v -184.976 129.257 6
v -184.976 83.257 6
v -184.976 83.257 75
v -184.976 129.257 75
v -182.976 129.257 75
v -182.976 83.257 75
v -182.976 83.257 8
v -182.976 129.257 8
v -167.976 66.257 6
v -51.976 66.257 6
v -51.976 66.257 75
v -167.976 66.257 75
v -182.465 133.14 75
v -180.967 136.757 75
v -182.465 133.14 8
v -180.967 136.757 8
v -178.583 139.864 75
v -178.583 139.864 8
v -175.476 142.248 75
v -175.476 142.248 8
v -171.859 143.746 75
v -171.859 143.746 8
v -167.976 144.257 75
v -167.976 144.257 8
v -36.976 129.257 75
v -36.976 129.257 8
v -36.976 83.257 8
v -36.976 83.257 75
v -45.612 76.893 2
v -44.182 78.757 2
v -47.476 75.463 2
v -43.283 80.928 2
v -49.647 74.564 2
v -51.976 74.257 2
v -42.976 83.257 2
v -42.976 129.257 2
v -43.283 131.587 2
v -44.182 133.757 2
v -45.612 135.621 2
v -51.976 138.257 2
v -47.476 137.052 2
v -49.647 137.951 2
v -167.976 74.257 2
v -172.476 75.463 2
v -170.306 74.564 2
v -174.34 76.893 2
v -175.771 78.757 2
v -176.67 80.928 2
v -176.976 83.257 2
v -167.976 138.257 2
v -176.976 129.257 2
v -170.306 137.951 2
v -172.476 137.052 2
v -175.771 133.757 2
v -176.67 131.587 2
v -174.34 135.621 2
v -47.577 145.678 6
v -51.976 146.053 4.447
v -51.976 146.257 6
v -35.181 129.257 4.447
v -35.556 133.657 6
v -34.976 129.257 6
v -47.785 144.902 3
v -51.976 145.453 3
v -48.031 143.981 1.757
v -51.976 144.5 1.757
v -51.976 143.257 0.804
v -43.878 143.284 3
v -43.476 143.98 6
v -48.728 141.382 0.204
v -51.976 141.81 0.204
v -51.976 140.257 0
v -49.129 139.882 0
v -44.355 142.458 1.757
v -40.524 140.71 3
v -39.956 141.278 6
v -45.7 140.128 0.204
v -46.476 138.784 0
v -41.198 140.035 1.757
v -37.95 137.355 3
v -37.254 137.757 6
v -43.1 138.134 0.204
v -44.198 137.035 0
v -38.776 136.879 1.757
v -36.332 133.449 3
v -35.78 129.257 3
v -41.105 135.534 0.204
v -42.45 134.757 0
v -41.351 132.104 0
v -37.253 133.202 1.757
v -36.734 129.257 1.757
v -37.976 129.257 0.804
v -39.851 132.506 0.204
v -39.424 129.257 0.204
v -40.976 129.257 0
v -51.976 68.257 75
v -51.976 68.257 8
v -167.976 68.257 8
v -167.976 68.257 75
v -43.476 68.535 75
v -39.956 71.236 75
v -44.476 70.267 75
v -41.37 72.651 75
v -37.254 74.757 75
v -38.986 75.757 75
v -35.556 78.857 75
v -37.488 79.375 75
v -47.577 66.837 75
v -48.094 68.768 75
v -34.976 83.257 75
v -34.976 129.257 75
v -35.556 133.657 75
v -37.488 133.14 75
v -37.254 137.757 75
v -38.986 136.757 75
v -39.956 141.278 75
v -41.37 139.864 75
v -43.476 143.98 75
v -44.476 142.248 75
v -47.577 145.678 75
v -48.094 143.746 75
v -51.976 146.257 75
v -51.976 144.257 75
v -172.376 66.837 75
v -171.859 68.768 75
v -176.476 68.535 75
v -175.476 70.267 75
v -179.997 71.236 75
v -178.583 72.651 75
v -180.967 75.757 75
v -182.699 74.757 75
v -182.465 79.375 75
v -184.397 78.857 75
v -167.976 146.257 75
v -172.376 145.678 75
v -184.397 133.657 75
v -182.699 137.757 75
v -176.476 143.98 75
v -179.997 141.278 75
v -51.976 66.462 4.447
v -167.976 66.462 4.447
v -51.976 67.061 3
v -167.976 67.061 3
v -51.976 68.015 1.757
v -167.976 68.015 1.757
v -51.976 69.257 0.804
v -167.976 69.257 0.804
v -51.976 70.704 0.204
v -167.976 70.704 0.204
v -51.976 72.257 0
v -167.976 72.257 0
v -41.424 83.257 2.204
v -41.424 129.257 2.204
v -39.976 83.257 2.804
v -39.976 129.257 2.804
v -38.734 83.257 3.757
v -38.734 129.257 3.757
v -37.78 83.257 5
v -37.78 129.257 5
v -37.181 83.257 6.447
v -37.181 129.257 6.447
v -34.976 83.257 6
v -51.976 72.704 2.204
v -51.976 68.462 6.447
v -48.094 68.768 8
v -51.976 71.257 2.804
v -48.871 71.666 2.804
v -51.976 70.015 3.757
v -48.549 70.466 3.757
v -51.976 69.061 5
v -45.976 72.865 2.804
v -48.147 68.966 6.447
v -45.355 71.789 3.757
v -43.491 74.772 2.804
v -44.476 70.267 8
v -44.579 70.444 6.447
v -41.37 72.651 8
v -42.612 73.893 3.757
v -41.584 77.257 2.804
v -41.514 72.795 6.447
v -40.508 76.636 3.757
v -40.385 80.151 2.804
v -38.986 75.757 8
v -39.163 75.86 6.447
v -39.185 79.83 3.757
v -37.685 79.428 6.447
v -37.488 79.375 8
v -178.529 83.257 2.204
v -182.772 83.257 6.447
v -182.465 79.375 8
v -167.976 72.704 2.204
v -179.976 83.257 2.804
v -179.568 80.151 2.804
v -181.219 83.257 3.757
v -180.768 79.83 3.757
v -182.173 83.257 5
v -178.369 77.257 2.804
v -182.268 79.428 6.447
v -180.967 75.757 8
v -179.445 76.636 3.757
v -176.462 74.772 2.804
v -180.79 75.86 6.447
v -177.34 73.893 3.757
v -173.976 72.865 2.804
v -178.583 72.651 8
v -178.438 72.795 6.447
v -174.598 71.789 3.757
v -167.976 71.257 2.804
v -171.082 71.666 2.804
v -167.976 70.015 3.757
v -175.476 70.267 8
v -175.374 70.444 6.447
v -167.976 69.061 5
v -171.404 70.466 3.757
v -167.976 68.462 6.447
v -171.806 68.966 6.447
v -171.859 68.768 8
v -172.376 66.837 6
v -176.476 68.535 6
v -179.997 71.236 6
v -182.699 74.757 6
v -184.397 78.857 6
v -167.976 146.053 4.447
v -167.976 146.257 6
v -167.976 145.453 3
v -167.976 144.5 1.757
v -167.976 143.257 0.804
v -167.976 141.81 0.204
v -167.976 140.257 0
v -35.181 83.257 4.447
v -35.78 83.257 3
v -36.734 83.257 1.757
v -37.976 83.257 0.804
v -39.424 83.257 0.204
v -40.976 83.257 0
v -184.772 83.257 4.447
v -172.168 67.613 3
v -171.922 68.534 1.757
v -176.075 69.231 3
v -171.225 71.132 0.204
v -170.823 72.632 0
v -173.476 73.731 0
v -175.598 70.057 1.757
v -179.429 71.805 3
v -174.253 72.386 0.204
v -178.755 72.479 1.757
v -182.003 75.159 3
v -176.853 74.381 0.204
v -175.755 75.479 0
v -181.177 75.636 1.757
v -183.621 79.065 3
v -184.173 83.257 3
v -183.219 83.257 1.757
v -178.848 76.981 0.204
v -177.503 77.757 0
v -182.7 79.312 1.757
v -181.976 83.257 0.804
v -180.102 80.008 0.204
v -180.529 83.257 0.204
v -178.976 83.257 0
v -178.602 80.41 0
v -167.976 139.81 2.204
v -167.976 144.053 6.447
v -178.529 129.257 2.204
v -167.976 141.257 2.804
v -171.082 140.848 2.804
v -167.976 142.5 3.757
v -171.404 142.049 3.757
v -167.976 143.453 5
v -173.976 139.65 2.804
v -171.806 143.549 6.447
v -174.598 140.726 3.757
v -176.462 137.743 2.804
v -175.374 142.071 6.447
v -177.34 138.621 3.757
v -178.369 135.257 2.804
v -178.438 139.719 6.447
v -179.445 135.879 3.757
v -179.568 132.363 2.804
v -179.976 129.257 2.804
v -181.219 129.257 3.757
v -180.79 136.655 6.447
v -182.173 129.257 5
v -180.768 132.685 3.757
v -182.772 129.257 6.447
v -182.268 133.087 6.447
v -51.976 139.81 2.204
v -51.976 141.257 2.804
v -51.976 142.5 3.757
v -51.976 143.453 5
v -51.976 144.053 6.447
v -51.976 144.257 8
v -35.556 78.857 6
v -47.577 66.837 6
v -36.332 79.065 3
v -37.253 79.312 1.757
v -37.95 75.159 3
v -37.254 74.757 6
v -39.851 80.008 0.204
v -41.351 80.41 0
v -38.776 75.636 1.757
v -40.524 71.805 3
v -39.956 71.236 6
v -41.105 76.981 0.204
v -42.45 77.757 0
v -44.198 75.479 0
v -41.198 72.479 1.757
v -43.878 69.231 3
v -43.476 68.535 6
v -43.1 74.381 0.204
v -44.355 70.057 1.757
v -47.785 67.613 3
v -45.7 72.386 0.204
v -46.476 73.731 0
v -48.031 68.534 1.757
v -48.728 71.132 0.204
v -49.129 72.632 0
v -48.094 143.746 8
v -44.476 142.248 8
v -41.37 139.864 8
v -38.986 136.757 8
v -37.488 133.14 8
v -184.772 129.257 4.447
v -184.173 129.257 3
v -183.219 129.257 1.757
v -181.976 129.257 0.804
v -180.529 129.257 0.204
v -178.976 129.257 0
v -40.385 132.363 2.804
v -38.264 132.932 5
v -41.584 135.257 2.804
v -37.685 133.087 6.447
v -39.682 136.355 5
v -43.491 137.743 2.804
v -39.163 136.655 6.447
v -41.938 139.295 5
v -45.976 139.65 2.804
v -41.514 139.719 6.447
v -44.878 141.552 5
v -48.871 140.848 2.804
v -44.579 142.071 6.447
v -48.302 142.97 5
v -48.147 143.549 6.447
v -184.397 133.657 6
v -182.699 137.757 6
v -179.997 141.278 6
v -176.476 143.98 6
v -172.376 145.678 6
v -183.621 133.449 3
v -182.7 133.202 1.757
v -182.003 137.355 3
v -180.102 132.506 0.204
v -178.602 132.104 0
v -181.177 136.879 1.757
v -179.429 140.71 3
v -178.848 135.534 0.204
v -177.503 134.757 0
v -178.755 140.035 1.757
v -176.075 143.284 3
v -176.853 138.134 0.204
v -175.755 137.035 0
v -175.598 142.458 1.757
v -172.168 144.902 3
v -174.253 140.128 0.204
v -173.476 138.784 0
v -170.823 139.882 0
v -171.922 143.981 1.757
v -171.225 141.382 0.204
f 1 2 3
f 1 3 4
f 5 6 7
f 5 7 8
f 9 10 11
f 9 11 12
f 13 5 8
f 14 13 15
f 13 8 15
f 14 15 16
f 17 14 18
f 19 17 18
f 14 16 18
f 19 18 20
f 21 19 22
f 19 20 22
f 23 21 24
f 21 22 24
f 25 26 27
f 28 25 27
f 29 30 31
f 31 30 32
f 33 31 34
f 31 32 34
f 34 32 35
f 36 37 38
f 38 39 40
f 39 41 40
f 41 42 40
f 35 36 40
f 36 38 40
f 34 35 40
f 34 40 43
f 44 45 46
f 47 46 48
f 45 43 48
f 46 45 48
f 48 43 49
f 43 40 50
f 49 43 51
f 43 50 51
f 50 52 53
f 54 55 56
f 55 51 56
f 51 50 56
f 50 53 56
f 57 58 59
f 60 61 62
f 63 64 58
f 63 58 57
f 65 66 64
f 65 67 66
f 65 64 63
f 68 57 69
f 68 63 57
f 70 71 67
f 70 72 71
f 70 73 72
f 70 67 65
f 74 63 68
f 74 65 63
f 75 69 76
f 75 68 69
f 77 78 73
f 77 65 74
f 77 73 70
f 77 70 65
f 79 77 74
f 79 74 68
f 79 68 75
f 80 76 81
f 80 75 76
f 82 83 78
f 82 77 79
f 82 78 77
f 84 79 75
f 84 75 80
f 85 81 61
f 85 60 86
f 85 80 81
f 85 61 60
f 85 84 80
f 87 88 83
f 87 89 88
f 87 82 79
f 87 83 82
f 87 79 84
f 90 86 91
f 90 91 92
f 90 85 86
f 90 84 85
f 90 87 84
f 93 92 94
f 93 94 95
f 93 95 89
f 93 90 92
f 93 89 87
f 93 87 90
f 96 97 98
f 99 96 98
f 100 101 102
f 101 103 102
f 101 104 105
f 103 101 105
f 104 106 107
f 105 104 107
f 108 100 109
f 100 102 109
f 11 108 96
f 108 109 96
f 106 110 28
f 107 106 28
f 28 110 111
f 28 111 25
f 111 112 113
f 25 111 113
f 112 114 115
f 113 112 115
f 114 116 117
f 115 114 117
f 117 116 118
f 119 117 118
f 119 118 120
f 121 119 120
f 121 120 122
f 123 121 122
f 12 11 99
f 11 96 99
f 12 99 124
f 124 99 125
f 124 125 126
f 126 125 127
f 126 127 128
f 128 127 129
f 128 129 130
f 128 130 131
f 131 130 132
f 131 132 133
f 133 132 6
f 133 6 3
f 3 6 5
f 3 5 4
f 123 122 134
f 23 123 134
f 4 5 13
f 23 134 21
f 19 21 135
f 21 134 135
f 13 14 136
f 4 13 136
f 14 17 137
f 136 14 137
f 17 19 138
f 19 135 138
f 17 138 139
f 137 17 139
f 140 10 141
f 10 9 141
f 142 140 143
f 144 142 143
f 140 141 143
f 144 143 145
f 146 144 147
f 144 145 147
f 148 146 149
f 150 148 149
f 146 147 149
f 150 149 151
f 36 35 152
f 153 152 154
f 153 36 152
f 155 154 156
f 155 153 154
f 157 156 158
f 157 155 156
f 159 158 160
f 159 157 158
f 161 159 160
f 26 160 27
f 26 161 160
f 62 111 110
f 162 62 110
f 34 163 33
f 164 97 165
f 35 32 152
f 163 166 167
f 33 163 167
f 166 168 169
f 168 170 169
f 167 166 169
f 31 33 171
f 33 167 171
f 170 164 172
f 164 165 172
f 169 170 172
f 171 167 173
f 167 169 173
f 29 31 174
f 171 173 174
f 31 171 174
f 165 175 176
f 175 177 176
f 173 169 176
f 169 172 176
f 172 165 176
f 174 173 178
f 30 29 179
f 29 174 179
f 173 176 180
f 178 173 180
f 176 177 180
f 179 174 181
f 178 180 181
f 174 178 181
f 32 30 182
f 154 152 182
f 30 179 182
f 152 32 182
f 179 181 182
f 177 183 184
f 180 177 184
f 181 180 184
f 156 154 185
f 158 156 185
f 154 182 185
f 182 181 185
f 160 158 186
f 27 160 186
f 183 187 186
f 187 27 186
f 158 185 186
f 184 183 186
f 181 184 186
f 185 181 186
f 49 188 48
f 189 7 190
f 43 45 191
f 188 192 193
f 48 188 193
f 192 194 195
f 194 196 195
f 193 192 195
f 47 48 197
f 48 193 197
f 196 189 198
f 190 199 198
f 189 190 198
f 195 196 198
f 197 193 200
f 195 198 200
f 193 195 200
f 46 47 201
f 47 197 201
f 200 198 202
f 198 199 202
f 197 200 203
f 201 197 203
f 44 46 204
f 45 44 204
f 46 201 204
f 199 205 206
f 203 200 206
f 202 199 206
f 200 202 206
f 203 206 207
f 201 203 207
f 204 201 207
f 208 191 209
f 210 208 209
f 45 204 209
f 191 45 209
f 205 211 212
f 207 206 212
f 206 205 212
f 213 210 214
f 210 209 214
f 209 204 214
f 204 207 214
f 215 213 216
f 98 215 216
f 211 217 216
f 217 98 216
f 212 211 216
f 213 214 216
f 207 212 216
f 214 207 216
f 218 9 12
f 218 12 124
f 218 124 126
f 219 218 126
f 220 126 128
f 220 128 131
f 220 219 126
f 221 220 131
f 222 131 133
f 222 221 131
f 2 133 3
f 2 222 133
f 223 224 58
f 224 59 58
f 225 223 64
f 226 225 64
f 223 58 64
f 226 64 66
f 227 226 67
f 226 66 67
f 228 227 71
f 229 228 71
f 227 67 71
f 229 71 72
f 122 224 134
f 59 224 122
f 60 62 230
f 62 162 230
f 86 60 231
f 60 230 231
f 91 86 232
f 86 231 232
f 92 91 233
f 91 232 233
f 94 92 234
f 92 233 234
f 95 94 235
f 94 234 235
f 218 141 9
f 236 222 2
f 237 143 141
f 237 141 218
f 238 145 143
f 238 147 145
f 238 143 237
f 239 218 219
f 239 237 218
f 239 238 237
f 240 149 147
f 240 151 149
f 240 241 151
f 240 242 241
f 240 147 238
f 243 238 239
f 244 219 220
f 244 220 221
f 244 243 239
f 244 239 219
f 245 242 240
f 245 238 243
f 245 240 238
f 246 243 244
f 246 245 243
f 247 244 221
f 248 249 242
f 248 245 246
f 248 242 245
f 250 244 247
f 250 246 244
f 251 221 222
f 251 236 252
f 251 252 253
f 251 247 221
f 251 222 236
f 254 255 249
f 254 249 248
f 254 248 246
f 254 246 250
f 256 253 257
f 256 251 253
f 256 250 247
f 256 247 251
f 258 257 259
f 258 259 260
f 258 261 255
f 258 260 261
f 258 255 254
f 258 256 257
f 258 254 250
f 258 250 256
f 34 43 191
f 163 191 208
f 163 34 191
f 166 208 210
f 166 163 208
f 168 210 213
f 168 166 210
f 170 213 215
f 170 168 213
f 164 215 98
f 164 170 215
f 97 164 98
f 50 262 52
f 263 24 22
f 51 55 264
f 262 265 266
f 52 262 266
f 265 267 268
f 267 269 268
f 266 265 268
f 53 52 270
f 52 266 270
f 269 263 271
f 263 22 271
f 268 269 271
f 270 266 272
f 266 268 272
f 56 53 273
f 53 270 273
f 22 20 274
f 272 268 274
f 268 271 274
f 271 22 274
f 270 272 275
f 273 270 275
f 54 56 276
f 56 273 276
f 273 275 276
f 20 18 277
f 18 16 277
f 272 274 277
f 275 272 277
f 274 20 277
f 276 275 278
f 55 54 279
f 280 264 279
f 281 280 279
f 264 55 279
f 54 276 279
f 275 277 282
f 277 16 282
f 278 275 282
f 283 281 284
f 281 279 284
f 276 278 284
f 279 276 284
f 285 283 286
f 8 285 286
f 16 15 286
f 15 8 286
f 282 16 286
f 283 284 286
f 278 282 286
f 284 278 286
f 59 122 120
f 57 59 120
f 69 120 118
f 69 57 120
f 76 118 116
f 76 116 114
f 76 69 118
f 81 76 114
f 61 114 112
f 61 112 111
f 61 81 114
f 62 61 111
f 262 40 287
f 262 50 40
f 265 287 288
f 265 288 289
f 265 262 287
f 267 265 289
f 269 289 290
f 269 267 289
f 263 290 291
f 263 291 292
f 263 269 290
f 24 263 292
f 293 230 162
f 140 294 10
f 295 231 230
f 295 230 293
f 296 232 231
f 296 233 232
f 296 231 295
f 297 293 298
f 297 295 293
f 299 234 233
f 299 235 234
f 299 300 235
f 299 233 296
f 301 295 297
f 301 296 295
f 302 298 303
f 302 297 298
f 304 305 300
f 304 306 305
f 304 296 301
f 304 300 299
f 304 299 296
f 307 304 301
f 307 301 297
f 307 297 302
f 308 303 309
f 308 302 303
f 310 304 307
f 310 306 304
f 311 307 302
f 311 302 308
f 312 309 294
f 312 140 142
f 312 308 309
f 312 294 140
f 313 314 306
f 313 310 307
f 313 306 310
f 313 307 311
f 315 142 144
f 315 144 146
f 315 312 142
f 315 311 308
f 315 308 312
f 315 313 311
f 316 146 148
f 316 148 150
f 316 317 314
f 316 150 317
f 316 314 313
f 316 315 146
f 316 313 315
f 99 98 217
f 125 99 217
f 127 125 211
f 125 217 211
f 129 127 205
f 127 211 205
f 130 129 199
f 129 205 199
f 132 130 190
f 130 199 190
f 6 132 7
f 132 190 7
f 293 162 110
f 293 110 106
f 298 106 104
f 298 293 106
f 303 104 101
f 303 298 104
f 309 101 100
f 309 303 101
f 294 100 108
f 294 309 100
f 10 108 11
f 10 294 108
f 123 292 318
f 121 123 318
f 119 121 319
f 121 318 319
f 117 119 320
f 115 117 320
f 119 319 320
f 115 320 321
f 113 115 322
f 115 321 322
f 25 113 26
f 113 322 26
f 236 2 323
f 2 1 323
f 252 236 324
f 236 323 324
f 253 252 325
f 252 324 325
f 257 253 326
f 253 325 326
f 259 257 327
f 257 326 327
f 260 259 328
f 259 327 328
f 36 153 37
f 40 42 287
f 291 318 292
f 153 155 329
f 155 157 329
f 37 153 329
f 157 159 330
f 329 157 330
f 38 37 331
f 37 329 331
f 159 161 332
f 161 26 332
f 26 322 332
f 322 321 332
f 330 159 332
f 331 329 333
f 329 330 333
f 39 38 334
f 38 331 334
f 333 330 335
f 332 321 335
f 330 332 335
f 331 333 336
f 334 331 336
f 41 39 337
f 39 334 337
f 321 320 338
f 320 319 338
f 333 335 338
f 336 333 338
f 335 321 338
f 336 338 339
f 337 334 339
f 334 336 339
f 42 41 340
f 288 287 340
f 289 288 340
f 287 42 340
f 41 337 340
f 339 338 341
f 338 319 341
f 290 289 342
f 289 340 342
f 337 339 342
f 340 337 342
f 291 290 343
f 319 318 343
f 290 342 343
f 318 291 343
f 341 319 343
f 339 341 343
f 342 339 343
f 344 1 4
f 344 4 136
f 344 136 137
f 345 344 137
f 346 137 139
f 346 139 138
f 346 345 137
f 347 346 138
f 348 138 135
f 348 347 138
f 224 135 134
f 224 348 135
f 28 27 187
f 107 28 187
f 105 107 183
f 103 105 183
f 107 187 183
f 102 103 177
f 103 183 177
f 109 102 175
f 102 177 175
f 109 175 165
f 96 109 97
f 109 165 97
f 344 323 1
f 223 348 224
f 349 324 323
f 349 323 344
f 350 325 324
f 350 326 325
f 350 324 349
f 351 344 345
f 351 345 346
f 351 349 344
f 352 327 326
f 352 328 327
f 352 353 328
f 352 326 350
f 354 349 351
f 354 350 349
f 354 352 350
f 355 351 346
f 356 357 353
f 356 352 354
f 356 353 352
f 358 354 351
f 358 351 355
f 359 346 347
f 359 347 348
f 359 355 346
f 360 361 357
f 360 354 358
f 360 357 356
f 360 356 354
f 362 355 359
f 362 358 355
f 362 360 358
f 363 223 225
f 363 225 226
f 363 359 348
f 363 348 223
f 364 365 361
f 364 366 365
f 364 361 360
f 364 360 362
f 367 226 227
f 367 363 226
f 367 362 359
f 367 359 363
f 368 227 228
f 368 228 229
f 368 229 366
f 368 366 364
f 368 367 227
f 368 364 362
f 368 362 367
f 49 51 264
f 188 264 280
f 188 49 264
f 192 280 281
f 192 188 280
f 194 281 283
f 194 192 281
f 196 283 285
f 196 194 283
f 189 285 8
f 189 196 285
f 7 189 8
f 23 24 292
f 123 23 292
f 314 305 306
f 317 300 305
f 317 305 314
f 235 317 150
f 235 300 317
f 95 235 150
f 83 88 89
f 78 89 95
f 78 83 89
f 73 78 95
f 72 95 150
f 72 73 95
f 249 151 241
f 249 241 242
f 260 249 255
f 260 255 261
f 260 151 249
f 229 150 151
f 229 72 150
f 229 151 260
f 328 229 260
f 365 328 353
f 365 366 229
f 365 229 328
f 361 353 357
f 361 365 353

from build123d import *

# Parameters (mm, degrees)
BOSS_EXTRUDE1_DEPTH = 75
BOSS_EXTRUDE2_DEPTH = 2
FILLET1_R           = 6


with BuildPart() as part:
    # Sketch2 → Boss-Extrude1 (new body)
    with BuildSketch(Plane.XY):
        with BuildLine():
            Line((-167.97646099, 146.257283518), (-51.97646099, 146.257283518))
            ThreePointArc((-51.97646099, 146.257283518), (-39.95564571, 141.278098799), (-34.97646099, 129.257283518))
            Line((-34.97646099, 129.257283518), (-34.97646099, 83.257283518))
            ThreePointArc((-34.97646099, 83.257283518), (-39.95564571, 71.236468238), (-51.97646099, 66.257283518))
            Line((-51.97646099, 66.257283518), (-167.97646099, 66.257283518))
            ThreePointArc((-167.97646099, 66.257283518), (-179.99727627, 71.236468238), (-184.97646099, 83.257283518))
            Line((-184.97646099, 83.257283518), (-184.97646099, 129.257283518))
            ThreePointArc((-184.97646099, 129.257283518), (-179.99727627, 141.278098799), (-167.97646099, 146.257283518))
        make_face()
        with BuildLine():
            Line((-167.97646099, 144.257283518), (-51.97646099, 144.257283518))
            ThreePointArc((-51.97646099, 144.257283518), (-41.369859272, 139.863885236), (-36.97646099, 129.257283518))
            Line((-36.97646099, 129.257283518), (-36.97646099, 83.257283518))
            ThreePointArc((-36.97646099, 83.257283518), (-41.369859272, 72.650681801), (-51.97646099, 68.257283518))
            Line((-51.97646099, 68.257283518), (-167.97646099, 68.257283518))
            ThreePointArc((-167.97646099, 68.257283518), (-178.583062708, 72.650681801), (-182.97646099, 83.257283518))
            Line((-182.97646099, 83.257283518), (-182.97646099, 129.257283518))
            ThreePointArc((-182.97646099, 129.257283518), (-178.583062708, 139.863885236), (-167.97646099, 144.257283518))
        make_face(mode=Mode.SUBTRACT)
    extrude(amount=BOSS_EXTRUDE1_DEPTH)

    # Sketch3 → Boss-Extrude2 (add)
    with BuildSketch(Plane(origin=(0, 0, 0), x_dir=(-1, 0, 0), z_dir=(0, 0, -1))):
        with BuildLine():
            Line((34.97646099, 129.257283518), (34.97646099, 83.257283518))
            ThreePointArc((34.97646099, 83.257283518), (39.95564571, 71.236468238), (51.97646099, 66.257283518))
            Line((51.97646099, 66.257283518), (167.97646099, 66.257283518))
            ThreePointArc((167.97646099, 66.257283518), (179.99727627, 71.236468238), (184.97646099, 83.257283518))
            Line((184.97646099, 83.257283518), (184.97646099, 129.257283518))
            ThreePointArc((184.97646099, 129.257283518), (179.99727627, 141.278098799), (167.97646099, 146.257283518))
            Line((167.97646099, 146.257283518), (51.97646099, 146.257283518))
            ThreePointArc((51.97646099, 146.257283518), (39.95564571, 141.278098799), (34.97646099, 129.257283518))
        make_face()
    extrude(amount=-BOSS_EXTRUDE2_DEPTH)

    # Fillet1
    fillet1_edges = [part.edges().sort_by_distance(p)[0] for p in [
        (-184.97646099, 106.257283518, 0),
        (-179.99727627, 141.278098799, 0),
        (-109.97646099, 146.257283518, 0),
        (-39.95564571, 141.278098799, 0),
        (-109.97646099, 144.257283518, 2),
        (-182.97646099, 106.257283518, 2),
        (-178.583062708, 139.863885236, 2),
        (-41.369859272, 139.863885236, 2),
        (-36.97646099, 106.257283518, 2),
        (-41.369859272, 72.650681801, 2),
        (-109.97646099, 68.257283518, 2),
        (-178.583062708, 72.650681801, 2),
        (-34.97646099, 106.257283518, 0),
        (-39.95564571, 71.236468238, 0),
        (-109.97646099, 66.257283518, 0),
        (-179.99727627, 71.236468238, 0),
    ]]
    fillet(fillet1_edges, radius=FILLET1_R)


solid = part.part
